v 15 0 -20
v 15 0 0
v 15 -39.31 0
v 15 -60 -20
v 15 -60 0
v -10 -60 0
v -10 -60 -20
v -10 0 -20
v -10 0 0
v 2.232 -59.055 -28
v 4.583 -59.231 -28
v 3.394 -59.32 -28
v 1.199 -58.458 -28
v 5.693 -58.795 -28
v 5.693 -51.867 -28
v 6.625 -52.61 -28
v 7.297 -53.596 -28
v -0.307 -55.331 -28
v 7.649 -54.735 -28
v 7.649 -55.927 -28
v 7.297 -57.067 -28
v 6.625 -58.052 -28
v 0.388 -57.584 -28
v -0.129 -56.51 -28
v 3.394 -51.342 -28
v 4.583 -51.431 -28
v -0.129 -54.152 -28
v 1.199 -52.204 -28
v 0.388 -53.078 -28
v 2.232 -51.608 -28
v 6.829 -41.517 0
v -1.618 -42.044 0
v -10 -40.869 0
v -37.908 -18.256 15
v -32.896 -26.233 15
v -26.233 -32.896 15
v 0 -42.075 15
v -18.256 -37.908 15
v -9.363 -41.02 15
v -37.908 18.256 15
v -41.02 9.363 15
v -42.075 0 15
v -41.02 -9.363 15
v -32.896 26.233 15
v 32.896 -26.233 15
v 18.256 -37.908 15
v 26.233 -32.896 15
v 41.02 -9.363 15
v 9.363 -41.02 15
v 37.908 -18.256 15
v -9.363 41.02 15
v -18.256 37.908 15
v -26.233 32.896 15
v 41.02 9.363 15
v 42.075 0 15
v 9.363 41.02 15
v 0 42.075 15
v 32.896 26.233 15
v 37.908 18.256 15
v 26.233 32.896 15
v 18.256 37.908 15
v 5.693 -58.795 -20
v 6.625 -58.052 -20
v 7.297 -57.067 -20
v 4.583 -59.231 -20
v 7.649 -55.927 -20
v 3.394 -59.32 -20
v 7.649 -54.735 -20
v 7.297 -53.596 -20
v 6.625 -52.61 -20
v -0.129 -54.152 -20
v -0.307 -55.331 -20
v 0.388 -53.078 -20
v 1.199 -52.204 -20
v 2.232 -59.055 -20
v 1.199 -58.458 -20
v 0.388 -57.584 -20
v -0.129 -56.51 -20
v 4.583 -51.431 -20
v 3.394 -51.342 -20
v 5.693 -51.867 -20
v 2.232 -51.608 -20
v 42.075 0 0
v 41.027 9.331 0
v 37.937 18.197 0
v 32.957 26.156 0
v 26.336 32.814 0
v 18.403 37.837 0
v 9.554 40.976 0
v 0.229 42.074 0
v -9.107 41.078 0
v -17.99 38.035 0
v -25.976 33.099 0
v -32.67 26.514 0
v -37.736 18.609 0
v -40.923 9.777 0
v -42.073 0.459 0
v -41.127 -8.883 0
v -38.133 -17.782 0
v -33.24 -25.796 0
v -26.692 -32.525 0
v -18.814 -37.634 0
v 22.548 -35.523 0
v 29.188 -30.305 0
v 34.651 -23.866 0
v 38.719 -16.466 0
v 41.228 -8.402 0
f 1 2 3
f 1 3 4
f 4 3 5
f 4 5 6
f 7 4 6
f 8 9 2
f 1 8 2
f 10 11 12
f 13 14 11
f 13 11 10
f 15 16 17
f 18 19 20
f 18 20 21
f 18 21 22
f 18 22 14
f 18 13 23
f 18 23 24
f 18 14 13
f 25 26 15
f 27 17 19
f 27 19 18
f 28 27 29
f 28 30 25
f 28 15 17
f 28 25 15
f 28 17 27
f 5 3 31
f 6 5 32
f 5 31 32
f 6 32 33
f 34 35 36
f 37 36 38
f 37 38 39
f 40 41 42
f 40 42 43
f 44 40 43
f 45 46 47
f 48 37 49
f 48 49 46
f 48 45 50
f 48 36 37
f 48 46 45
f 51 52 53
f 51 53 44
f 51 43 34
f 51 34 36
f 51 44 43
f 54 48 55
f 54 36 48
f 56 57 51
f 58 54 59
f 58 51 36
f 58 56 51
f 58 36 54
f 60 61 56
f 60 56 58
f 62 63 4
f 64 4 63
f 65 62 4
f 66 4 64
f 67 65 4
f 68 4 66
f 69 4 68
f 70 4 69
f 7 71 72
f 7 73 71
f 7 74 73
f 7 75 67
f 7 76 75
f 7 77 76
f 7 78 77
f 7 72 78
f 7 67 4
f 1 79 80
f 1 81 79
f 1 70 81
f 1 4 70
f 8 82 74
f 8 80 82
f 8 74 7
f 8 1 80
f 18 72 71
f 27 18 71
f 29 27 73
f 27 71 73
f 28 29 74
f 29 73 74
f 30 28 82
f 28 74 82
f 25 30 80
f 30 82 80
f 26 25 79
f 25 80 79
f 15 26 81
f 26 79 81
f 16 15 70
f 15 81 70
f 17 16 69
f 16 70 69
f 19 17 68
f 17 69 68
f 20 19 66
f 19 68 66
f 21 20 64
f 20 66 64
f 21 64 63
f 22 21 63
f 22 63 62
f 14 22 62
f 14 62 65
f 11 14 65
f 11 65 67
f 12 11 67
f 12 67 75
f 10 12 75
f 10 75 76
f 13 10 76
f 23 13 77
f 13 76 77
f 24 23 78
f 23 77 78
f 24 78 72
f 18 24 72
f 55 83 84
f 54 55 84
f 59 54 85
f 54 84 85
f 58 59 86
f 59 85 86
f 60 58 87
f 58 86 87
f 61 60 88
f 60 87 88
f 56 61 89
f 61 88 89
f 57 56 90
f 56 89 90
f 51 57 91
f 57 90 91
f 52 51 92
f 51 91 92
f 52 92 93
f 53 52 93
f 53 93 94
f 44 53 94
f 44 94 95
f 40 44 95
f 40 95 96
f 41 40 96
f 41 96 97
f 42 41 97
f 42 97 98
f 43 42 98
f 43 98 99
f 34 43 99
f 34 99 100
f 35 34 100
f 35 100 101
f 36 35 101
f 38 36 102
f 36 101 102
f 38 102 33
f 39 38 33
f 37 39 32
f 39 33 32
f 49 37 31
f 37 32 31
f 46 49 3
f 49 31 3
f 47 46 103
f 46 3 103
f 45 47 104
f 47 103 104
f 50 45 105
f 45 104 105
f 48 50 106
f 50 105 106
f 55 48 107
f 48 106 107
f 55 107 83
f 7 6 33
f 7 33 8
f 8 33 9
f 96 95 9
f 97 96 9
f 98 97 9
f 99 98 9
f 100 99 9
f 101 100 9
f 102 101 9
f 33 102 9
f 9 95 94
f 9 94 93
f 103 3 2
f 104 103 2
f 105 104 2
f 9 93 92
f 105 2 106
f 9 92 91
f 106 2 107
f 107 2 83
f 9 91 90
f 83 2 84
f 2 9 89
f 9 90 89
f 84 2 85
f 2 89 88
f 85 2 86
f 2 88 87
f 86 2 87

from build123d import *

# Parameters (mm, degrees)
SKETCH1_R           = 42.075
BOSS_EXTRUDE1_DEPTH = 15
BOSS_EXTRUDE3_DEPTH = 20
SKETCH10_R          = 4
BOSS_EXTRUDE8_DEPTH = 8


with BuildPart() as part:
    # Sketch1 → Boss-Extrude1 (new body)
    with BuildSketch(Plane.XY):
        Circle(SKETCH1_R)
    extrude(amount=BOSS_EXTRUDE1_DEPTH)

    # Sketch4 → Boss-Extrude3 (add)
    with BuildSketch(Plane(origin=(0, 0, 0), x_dir=(-1, 0, 0), z_dir=(0, 0, -1))):
        Polygon((10, 0), (0, 0), (-15, 0), (-15, -60), (10, -60), align=None)
    extrude(amount=BOSS_EXTRUDE3_DEPTH)

    # Sketch10 → Boss-Extrude8 (add)
    with BuildSketch(Plane(origin=(0, 0, -20), x_dir=(-1, 0, 0), z_dir=(0, 0, -1))):
        with Locations((-3.69323872, -55.331161555)):
            Circle(SKETCH10_R)
    extrude(amount=BOSS_EXTRUDE8_DEPTH)


solid = part.part
